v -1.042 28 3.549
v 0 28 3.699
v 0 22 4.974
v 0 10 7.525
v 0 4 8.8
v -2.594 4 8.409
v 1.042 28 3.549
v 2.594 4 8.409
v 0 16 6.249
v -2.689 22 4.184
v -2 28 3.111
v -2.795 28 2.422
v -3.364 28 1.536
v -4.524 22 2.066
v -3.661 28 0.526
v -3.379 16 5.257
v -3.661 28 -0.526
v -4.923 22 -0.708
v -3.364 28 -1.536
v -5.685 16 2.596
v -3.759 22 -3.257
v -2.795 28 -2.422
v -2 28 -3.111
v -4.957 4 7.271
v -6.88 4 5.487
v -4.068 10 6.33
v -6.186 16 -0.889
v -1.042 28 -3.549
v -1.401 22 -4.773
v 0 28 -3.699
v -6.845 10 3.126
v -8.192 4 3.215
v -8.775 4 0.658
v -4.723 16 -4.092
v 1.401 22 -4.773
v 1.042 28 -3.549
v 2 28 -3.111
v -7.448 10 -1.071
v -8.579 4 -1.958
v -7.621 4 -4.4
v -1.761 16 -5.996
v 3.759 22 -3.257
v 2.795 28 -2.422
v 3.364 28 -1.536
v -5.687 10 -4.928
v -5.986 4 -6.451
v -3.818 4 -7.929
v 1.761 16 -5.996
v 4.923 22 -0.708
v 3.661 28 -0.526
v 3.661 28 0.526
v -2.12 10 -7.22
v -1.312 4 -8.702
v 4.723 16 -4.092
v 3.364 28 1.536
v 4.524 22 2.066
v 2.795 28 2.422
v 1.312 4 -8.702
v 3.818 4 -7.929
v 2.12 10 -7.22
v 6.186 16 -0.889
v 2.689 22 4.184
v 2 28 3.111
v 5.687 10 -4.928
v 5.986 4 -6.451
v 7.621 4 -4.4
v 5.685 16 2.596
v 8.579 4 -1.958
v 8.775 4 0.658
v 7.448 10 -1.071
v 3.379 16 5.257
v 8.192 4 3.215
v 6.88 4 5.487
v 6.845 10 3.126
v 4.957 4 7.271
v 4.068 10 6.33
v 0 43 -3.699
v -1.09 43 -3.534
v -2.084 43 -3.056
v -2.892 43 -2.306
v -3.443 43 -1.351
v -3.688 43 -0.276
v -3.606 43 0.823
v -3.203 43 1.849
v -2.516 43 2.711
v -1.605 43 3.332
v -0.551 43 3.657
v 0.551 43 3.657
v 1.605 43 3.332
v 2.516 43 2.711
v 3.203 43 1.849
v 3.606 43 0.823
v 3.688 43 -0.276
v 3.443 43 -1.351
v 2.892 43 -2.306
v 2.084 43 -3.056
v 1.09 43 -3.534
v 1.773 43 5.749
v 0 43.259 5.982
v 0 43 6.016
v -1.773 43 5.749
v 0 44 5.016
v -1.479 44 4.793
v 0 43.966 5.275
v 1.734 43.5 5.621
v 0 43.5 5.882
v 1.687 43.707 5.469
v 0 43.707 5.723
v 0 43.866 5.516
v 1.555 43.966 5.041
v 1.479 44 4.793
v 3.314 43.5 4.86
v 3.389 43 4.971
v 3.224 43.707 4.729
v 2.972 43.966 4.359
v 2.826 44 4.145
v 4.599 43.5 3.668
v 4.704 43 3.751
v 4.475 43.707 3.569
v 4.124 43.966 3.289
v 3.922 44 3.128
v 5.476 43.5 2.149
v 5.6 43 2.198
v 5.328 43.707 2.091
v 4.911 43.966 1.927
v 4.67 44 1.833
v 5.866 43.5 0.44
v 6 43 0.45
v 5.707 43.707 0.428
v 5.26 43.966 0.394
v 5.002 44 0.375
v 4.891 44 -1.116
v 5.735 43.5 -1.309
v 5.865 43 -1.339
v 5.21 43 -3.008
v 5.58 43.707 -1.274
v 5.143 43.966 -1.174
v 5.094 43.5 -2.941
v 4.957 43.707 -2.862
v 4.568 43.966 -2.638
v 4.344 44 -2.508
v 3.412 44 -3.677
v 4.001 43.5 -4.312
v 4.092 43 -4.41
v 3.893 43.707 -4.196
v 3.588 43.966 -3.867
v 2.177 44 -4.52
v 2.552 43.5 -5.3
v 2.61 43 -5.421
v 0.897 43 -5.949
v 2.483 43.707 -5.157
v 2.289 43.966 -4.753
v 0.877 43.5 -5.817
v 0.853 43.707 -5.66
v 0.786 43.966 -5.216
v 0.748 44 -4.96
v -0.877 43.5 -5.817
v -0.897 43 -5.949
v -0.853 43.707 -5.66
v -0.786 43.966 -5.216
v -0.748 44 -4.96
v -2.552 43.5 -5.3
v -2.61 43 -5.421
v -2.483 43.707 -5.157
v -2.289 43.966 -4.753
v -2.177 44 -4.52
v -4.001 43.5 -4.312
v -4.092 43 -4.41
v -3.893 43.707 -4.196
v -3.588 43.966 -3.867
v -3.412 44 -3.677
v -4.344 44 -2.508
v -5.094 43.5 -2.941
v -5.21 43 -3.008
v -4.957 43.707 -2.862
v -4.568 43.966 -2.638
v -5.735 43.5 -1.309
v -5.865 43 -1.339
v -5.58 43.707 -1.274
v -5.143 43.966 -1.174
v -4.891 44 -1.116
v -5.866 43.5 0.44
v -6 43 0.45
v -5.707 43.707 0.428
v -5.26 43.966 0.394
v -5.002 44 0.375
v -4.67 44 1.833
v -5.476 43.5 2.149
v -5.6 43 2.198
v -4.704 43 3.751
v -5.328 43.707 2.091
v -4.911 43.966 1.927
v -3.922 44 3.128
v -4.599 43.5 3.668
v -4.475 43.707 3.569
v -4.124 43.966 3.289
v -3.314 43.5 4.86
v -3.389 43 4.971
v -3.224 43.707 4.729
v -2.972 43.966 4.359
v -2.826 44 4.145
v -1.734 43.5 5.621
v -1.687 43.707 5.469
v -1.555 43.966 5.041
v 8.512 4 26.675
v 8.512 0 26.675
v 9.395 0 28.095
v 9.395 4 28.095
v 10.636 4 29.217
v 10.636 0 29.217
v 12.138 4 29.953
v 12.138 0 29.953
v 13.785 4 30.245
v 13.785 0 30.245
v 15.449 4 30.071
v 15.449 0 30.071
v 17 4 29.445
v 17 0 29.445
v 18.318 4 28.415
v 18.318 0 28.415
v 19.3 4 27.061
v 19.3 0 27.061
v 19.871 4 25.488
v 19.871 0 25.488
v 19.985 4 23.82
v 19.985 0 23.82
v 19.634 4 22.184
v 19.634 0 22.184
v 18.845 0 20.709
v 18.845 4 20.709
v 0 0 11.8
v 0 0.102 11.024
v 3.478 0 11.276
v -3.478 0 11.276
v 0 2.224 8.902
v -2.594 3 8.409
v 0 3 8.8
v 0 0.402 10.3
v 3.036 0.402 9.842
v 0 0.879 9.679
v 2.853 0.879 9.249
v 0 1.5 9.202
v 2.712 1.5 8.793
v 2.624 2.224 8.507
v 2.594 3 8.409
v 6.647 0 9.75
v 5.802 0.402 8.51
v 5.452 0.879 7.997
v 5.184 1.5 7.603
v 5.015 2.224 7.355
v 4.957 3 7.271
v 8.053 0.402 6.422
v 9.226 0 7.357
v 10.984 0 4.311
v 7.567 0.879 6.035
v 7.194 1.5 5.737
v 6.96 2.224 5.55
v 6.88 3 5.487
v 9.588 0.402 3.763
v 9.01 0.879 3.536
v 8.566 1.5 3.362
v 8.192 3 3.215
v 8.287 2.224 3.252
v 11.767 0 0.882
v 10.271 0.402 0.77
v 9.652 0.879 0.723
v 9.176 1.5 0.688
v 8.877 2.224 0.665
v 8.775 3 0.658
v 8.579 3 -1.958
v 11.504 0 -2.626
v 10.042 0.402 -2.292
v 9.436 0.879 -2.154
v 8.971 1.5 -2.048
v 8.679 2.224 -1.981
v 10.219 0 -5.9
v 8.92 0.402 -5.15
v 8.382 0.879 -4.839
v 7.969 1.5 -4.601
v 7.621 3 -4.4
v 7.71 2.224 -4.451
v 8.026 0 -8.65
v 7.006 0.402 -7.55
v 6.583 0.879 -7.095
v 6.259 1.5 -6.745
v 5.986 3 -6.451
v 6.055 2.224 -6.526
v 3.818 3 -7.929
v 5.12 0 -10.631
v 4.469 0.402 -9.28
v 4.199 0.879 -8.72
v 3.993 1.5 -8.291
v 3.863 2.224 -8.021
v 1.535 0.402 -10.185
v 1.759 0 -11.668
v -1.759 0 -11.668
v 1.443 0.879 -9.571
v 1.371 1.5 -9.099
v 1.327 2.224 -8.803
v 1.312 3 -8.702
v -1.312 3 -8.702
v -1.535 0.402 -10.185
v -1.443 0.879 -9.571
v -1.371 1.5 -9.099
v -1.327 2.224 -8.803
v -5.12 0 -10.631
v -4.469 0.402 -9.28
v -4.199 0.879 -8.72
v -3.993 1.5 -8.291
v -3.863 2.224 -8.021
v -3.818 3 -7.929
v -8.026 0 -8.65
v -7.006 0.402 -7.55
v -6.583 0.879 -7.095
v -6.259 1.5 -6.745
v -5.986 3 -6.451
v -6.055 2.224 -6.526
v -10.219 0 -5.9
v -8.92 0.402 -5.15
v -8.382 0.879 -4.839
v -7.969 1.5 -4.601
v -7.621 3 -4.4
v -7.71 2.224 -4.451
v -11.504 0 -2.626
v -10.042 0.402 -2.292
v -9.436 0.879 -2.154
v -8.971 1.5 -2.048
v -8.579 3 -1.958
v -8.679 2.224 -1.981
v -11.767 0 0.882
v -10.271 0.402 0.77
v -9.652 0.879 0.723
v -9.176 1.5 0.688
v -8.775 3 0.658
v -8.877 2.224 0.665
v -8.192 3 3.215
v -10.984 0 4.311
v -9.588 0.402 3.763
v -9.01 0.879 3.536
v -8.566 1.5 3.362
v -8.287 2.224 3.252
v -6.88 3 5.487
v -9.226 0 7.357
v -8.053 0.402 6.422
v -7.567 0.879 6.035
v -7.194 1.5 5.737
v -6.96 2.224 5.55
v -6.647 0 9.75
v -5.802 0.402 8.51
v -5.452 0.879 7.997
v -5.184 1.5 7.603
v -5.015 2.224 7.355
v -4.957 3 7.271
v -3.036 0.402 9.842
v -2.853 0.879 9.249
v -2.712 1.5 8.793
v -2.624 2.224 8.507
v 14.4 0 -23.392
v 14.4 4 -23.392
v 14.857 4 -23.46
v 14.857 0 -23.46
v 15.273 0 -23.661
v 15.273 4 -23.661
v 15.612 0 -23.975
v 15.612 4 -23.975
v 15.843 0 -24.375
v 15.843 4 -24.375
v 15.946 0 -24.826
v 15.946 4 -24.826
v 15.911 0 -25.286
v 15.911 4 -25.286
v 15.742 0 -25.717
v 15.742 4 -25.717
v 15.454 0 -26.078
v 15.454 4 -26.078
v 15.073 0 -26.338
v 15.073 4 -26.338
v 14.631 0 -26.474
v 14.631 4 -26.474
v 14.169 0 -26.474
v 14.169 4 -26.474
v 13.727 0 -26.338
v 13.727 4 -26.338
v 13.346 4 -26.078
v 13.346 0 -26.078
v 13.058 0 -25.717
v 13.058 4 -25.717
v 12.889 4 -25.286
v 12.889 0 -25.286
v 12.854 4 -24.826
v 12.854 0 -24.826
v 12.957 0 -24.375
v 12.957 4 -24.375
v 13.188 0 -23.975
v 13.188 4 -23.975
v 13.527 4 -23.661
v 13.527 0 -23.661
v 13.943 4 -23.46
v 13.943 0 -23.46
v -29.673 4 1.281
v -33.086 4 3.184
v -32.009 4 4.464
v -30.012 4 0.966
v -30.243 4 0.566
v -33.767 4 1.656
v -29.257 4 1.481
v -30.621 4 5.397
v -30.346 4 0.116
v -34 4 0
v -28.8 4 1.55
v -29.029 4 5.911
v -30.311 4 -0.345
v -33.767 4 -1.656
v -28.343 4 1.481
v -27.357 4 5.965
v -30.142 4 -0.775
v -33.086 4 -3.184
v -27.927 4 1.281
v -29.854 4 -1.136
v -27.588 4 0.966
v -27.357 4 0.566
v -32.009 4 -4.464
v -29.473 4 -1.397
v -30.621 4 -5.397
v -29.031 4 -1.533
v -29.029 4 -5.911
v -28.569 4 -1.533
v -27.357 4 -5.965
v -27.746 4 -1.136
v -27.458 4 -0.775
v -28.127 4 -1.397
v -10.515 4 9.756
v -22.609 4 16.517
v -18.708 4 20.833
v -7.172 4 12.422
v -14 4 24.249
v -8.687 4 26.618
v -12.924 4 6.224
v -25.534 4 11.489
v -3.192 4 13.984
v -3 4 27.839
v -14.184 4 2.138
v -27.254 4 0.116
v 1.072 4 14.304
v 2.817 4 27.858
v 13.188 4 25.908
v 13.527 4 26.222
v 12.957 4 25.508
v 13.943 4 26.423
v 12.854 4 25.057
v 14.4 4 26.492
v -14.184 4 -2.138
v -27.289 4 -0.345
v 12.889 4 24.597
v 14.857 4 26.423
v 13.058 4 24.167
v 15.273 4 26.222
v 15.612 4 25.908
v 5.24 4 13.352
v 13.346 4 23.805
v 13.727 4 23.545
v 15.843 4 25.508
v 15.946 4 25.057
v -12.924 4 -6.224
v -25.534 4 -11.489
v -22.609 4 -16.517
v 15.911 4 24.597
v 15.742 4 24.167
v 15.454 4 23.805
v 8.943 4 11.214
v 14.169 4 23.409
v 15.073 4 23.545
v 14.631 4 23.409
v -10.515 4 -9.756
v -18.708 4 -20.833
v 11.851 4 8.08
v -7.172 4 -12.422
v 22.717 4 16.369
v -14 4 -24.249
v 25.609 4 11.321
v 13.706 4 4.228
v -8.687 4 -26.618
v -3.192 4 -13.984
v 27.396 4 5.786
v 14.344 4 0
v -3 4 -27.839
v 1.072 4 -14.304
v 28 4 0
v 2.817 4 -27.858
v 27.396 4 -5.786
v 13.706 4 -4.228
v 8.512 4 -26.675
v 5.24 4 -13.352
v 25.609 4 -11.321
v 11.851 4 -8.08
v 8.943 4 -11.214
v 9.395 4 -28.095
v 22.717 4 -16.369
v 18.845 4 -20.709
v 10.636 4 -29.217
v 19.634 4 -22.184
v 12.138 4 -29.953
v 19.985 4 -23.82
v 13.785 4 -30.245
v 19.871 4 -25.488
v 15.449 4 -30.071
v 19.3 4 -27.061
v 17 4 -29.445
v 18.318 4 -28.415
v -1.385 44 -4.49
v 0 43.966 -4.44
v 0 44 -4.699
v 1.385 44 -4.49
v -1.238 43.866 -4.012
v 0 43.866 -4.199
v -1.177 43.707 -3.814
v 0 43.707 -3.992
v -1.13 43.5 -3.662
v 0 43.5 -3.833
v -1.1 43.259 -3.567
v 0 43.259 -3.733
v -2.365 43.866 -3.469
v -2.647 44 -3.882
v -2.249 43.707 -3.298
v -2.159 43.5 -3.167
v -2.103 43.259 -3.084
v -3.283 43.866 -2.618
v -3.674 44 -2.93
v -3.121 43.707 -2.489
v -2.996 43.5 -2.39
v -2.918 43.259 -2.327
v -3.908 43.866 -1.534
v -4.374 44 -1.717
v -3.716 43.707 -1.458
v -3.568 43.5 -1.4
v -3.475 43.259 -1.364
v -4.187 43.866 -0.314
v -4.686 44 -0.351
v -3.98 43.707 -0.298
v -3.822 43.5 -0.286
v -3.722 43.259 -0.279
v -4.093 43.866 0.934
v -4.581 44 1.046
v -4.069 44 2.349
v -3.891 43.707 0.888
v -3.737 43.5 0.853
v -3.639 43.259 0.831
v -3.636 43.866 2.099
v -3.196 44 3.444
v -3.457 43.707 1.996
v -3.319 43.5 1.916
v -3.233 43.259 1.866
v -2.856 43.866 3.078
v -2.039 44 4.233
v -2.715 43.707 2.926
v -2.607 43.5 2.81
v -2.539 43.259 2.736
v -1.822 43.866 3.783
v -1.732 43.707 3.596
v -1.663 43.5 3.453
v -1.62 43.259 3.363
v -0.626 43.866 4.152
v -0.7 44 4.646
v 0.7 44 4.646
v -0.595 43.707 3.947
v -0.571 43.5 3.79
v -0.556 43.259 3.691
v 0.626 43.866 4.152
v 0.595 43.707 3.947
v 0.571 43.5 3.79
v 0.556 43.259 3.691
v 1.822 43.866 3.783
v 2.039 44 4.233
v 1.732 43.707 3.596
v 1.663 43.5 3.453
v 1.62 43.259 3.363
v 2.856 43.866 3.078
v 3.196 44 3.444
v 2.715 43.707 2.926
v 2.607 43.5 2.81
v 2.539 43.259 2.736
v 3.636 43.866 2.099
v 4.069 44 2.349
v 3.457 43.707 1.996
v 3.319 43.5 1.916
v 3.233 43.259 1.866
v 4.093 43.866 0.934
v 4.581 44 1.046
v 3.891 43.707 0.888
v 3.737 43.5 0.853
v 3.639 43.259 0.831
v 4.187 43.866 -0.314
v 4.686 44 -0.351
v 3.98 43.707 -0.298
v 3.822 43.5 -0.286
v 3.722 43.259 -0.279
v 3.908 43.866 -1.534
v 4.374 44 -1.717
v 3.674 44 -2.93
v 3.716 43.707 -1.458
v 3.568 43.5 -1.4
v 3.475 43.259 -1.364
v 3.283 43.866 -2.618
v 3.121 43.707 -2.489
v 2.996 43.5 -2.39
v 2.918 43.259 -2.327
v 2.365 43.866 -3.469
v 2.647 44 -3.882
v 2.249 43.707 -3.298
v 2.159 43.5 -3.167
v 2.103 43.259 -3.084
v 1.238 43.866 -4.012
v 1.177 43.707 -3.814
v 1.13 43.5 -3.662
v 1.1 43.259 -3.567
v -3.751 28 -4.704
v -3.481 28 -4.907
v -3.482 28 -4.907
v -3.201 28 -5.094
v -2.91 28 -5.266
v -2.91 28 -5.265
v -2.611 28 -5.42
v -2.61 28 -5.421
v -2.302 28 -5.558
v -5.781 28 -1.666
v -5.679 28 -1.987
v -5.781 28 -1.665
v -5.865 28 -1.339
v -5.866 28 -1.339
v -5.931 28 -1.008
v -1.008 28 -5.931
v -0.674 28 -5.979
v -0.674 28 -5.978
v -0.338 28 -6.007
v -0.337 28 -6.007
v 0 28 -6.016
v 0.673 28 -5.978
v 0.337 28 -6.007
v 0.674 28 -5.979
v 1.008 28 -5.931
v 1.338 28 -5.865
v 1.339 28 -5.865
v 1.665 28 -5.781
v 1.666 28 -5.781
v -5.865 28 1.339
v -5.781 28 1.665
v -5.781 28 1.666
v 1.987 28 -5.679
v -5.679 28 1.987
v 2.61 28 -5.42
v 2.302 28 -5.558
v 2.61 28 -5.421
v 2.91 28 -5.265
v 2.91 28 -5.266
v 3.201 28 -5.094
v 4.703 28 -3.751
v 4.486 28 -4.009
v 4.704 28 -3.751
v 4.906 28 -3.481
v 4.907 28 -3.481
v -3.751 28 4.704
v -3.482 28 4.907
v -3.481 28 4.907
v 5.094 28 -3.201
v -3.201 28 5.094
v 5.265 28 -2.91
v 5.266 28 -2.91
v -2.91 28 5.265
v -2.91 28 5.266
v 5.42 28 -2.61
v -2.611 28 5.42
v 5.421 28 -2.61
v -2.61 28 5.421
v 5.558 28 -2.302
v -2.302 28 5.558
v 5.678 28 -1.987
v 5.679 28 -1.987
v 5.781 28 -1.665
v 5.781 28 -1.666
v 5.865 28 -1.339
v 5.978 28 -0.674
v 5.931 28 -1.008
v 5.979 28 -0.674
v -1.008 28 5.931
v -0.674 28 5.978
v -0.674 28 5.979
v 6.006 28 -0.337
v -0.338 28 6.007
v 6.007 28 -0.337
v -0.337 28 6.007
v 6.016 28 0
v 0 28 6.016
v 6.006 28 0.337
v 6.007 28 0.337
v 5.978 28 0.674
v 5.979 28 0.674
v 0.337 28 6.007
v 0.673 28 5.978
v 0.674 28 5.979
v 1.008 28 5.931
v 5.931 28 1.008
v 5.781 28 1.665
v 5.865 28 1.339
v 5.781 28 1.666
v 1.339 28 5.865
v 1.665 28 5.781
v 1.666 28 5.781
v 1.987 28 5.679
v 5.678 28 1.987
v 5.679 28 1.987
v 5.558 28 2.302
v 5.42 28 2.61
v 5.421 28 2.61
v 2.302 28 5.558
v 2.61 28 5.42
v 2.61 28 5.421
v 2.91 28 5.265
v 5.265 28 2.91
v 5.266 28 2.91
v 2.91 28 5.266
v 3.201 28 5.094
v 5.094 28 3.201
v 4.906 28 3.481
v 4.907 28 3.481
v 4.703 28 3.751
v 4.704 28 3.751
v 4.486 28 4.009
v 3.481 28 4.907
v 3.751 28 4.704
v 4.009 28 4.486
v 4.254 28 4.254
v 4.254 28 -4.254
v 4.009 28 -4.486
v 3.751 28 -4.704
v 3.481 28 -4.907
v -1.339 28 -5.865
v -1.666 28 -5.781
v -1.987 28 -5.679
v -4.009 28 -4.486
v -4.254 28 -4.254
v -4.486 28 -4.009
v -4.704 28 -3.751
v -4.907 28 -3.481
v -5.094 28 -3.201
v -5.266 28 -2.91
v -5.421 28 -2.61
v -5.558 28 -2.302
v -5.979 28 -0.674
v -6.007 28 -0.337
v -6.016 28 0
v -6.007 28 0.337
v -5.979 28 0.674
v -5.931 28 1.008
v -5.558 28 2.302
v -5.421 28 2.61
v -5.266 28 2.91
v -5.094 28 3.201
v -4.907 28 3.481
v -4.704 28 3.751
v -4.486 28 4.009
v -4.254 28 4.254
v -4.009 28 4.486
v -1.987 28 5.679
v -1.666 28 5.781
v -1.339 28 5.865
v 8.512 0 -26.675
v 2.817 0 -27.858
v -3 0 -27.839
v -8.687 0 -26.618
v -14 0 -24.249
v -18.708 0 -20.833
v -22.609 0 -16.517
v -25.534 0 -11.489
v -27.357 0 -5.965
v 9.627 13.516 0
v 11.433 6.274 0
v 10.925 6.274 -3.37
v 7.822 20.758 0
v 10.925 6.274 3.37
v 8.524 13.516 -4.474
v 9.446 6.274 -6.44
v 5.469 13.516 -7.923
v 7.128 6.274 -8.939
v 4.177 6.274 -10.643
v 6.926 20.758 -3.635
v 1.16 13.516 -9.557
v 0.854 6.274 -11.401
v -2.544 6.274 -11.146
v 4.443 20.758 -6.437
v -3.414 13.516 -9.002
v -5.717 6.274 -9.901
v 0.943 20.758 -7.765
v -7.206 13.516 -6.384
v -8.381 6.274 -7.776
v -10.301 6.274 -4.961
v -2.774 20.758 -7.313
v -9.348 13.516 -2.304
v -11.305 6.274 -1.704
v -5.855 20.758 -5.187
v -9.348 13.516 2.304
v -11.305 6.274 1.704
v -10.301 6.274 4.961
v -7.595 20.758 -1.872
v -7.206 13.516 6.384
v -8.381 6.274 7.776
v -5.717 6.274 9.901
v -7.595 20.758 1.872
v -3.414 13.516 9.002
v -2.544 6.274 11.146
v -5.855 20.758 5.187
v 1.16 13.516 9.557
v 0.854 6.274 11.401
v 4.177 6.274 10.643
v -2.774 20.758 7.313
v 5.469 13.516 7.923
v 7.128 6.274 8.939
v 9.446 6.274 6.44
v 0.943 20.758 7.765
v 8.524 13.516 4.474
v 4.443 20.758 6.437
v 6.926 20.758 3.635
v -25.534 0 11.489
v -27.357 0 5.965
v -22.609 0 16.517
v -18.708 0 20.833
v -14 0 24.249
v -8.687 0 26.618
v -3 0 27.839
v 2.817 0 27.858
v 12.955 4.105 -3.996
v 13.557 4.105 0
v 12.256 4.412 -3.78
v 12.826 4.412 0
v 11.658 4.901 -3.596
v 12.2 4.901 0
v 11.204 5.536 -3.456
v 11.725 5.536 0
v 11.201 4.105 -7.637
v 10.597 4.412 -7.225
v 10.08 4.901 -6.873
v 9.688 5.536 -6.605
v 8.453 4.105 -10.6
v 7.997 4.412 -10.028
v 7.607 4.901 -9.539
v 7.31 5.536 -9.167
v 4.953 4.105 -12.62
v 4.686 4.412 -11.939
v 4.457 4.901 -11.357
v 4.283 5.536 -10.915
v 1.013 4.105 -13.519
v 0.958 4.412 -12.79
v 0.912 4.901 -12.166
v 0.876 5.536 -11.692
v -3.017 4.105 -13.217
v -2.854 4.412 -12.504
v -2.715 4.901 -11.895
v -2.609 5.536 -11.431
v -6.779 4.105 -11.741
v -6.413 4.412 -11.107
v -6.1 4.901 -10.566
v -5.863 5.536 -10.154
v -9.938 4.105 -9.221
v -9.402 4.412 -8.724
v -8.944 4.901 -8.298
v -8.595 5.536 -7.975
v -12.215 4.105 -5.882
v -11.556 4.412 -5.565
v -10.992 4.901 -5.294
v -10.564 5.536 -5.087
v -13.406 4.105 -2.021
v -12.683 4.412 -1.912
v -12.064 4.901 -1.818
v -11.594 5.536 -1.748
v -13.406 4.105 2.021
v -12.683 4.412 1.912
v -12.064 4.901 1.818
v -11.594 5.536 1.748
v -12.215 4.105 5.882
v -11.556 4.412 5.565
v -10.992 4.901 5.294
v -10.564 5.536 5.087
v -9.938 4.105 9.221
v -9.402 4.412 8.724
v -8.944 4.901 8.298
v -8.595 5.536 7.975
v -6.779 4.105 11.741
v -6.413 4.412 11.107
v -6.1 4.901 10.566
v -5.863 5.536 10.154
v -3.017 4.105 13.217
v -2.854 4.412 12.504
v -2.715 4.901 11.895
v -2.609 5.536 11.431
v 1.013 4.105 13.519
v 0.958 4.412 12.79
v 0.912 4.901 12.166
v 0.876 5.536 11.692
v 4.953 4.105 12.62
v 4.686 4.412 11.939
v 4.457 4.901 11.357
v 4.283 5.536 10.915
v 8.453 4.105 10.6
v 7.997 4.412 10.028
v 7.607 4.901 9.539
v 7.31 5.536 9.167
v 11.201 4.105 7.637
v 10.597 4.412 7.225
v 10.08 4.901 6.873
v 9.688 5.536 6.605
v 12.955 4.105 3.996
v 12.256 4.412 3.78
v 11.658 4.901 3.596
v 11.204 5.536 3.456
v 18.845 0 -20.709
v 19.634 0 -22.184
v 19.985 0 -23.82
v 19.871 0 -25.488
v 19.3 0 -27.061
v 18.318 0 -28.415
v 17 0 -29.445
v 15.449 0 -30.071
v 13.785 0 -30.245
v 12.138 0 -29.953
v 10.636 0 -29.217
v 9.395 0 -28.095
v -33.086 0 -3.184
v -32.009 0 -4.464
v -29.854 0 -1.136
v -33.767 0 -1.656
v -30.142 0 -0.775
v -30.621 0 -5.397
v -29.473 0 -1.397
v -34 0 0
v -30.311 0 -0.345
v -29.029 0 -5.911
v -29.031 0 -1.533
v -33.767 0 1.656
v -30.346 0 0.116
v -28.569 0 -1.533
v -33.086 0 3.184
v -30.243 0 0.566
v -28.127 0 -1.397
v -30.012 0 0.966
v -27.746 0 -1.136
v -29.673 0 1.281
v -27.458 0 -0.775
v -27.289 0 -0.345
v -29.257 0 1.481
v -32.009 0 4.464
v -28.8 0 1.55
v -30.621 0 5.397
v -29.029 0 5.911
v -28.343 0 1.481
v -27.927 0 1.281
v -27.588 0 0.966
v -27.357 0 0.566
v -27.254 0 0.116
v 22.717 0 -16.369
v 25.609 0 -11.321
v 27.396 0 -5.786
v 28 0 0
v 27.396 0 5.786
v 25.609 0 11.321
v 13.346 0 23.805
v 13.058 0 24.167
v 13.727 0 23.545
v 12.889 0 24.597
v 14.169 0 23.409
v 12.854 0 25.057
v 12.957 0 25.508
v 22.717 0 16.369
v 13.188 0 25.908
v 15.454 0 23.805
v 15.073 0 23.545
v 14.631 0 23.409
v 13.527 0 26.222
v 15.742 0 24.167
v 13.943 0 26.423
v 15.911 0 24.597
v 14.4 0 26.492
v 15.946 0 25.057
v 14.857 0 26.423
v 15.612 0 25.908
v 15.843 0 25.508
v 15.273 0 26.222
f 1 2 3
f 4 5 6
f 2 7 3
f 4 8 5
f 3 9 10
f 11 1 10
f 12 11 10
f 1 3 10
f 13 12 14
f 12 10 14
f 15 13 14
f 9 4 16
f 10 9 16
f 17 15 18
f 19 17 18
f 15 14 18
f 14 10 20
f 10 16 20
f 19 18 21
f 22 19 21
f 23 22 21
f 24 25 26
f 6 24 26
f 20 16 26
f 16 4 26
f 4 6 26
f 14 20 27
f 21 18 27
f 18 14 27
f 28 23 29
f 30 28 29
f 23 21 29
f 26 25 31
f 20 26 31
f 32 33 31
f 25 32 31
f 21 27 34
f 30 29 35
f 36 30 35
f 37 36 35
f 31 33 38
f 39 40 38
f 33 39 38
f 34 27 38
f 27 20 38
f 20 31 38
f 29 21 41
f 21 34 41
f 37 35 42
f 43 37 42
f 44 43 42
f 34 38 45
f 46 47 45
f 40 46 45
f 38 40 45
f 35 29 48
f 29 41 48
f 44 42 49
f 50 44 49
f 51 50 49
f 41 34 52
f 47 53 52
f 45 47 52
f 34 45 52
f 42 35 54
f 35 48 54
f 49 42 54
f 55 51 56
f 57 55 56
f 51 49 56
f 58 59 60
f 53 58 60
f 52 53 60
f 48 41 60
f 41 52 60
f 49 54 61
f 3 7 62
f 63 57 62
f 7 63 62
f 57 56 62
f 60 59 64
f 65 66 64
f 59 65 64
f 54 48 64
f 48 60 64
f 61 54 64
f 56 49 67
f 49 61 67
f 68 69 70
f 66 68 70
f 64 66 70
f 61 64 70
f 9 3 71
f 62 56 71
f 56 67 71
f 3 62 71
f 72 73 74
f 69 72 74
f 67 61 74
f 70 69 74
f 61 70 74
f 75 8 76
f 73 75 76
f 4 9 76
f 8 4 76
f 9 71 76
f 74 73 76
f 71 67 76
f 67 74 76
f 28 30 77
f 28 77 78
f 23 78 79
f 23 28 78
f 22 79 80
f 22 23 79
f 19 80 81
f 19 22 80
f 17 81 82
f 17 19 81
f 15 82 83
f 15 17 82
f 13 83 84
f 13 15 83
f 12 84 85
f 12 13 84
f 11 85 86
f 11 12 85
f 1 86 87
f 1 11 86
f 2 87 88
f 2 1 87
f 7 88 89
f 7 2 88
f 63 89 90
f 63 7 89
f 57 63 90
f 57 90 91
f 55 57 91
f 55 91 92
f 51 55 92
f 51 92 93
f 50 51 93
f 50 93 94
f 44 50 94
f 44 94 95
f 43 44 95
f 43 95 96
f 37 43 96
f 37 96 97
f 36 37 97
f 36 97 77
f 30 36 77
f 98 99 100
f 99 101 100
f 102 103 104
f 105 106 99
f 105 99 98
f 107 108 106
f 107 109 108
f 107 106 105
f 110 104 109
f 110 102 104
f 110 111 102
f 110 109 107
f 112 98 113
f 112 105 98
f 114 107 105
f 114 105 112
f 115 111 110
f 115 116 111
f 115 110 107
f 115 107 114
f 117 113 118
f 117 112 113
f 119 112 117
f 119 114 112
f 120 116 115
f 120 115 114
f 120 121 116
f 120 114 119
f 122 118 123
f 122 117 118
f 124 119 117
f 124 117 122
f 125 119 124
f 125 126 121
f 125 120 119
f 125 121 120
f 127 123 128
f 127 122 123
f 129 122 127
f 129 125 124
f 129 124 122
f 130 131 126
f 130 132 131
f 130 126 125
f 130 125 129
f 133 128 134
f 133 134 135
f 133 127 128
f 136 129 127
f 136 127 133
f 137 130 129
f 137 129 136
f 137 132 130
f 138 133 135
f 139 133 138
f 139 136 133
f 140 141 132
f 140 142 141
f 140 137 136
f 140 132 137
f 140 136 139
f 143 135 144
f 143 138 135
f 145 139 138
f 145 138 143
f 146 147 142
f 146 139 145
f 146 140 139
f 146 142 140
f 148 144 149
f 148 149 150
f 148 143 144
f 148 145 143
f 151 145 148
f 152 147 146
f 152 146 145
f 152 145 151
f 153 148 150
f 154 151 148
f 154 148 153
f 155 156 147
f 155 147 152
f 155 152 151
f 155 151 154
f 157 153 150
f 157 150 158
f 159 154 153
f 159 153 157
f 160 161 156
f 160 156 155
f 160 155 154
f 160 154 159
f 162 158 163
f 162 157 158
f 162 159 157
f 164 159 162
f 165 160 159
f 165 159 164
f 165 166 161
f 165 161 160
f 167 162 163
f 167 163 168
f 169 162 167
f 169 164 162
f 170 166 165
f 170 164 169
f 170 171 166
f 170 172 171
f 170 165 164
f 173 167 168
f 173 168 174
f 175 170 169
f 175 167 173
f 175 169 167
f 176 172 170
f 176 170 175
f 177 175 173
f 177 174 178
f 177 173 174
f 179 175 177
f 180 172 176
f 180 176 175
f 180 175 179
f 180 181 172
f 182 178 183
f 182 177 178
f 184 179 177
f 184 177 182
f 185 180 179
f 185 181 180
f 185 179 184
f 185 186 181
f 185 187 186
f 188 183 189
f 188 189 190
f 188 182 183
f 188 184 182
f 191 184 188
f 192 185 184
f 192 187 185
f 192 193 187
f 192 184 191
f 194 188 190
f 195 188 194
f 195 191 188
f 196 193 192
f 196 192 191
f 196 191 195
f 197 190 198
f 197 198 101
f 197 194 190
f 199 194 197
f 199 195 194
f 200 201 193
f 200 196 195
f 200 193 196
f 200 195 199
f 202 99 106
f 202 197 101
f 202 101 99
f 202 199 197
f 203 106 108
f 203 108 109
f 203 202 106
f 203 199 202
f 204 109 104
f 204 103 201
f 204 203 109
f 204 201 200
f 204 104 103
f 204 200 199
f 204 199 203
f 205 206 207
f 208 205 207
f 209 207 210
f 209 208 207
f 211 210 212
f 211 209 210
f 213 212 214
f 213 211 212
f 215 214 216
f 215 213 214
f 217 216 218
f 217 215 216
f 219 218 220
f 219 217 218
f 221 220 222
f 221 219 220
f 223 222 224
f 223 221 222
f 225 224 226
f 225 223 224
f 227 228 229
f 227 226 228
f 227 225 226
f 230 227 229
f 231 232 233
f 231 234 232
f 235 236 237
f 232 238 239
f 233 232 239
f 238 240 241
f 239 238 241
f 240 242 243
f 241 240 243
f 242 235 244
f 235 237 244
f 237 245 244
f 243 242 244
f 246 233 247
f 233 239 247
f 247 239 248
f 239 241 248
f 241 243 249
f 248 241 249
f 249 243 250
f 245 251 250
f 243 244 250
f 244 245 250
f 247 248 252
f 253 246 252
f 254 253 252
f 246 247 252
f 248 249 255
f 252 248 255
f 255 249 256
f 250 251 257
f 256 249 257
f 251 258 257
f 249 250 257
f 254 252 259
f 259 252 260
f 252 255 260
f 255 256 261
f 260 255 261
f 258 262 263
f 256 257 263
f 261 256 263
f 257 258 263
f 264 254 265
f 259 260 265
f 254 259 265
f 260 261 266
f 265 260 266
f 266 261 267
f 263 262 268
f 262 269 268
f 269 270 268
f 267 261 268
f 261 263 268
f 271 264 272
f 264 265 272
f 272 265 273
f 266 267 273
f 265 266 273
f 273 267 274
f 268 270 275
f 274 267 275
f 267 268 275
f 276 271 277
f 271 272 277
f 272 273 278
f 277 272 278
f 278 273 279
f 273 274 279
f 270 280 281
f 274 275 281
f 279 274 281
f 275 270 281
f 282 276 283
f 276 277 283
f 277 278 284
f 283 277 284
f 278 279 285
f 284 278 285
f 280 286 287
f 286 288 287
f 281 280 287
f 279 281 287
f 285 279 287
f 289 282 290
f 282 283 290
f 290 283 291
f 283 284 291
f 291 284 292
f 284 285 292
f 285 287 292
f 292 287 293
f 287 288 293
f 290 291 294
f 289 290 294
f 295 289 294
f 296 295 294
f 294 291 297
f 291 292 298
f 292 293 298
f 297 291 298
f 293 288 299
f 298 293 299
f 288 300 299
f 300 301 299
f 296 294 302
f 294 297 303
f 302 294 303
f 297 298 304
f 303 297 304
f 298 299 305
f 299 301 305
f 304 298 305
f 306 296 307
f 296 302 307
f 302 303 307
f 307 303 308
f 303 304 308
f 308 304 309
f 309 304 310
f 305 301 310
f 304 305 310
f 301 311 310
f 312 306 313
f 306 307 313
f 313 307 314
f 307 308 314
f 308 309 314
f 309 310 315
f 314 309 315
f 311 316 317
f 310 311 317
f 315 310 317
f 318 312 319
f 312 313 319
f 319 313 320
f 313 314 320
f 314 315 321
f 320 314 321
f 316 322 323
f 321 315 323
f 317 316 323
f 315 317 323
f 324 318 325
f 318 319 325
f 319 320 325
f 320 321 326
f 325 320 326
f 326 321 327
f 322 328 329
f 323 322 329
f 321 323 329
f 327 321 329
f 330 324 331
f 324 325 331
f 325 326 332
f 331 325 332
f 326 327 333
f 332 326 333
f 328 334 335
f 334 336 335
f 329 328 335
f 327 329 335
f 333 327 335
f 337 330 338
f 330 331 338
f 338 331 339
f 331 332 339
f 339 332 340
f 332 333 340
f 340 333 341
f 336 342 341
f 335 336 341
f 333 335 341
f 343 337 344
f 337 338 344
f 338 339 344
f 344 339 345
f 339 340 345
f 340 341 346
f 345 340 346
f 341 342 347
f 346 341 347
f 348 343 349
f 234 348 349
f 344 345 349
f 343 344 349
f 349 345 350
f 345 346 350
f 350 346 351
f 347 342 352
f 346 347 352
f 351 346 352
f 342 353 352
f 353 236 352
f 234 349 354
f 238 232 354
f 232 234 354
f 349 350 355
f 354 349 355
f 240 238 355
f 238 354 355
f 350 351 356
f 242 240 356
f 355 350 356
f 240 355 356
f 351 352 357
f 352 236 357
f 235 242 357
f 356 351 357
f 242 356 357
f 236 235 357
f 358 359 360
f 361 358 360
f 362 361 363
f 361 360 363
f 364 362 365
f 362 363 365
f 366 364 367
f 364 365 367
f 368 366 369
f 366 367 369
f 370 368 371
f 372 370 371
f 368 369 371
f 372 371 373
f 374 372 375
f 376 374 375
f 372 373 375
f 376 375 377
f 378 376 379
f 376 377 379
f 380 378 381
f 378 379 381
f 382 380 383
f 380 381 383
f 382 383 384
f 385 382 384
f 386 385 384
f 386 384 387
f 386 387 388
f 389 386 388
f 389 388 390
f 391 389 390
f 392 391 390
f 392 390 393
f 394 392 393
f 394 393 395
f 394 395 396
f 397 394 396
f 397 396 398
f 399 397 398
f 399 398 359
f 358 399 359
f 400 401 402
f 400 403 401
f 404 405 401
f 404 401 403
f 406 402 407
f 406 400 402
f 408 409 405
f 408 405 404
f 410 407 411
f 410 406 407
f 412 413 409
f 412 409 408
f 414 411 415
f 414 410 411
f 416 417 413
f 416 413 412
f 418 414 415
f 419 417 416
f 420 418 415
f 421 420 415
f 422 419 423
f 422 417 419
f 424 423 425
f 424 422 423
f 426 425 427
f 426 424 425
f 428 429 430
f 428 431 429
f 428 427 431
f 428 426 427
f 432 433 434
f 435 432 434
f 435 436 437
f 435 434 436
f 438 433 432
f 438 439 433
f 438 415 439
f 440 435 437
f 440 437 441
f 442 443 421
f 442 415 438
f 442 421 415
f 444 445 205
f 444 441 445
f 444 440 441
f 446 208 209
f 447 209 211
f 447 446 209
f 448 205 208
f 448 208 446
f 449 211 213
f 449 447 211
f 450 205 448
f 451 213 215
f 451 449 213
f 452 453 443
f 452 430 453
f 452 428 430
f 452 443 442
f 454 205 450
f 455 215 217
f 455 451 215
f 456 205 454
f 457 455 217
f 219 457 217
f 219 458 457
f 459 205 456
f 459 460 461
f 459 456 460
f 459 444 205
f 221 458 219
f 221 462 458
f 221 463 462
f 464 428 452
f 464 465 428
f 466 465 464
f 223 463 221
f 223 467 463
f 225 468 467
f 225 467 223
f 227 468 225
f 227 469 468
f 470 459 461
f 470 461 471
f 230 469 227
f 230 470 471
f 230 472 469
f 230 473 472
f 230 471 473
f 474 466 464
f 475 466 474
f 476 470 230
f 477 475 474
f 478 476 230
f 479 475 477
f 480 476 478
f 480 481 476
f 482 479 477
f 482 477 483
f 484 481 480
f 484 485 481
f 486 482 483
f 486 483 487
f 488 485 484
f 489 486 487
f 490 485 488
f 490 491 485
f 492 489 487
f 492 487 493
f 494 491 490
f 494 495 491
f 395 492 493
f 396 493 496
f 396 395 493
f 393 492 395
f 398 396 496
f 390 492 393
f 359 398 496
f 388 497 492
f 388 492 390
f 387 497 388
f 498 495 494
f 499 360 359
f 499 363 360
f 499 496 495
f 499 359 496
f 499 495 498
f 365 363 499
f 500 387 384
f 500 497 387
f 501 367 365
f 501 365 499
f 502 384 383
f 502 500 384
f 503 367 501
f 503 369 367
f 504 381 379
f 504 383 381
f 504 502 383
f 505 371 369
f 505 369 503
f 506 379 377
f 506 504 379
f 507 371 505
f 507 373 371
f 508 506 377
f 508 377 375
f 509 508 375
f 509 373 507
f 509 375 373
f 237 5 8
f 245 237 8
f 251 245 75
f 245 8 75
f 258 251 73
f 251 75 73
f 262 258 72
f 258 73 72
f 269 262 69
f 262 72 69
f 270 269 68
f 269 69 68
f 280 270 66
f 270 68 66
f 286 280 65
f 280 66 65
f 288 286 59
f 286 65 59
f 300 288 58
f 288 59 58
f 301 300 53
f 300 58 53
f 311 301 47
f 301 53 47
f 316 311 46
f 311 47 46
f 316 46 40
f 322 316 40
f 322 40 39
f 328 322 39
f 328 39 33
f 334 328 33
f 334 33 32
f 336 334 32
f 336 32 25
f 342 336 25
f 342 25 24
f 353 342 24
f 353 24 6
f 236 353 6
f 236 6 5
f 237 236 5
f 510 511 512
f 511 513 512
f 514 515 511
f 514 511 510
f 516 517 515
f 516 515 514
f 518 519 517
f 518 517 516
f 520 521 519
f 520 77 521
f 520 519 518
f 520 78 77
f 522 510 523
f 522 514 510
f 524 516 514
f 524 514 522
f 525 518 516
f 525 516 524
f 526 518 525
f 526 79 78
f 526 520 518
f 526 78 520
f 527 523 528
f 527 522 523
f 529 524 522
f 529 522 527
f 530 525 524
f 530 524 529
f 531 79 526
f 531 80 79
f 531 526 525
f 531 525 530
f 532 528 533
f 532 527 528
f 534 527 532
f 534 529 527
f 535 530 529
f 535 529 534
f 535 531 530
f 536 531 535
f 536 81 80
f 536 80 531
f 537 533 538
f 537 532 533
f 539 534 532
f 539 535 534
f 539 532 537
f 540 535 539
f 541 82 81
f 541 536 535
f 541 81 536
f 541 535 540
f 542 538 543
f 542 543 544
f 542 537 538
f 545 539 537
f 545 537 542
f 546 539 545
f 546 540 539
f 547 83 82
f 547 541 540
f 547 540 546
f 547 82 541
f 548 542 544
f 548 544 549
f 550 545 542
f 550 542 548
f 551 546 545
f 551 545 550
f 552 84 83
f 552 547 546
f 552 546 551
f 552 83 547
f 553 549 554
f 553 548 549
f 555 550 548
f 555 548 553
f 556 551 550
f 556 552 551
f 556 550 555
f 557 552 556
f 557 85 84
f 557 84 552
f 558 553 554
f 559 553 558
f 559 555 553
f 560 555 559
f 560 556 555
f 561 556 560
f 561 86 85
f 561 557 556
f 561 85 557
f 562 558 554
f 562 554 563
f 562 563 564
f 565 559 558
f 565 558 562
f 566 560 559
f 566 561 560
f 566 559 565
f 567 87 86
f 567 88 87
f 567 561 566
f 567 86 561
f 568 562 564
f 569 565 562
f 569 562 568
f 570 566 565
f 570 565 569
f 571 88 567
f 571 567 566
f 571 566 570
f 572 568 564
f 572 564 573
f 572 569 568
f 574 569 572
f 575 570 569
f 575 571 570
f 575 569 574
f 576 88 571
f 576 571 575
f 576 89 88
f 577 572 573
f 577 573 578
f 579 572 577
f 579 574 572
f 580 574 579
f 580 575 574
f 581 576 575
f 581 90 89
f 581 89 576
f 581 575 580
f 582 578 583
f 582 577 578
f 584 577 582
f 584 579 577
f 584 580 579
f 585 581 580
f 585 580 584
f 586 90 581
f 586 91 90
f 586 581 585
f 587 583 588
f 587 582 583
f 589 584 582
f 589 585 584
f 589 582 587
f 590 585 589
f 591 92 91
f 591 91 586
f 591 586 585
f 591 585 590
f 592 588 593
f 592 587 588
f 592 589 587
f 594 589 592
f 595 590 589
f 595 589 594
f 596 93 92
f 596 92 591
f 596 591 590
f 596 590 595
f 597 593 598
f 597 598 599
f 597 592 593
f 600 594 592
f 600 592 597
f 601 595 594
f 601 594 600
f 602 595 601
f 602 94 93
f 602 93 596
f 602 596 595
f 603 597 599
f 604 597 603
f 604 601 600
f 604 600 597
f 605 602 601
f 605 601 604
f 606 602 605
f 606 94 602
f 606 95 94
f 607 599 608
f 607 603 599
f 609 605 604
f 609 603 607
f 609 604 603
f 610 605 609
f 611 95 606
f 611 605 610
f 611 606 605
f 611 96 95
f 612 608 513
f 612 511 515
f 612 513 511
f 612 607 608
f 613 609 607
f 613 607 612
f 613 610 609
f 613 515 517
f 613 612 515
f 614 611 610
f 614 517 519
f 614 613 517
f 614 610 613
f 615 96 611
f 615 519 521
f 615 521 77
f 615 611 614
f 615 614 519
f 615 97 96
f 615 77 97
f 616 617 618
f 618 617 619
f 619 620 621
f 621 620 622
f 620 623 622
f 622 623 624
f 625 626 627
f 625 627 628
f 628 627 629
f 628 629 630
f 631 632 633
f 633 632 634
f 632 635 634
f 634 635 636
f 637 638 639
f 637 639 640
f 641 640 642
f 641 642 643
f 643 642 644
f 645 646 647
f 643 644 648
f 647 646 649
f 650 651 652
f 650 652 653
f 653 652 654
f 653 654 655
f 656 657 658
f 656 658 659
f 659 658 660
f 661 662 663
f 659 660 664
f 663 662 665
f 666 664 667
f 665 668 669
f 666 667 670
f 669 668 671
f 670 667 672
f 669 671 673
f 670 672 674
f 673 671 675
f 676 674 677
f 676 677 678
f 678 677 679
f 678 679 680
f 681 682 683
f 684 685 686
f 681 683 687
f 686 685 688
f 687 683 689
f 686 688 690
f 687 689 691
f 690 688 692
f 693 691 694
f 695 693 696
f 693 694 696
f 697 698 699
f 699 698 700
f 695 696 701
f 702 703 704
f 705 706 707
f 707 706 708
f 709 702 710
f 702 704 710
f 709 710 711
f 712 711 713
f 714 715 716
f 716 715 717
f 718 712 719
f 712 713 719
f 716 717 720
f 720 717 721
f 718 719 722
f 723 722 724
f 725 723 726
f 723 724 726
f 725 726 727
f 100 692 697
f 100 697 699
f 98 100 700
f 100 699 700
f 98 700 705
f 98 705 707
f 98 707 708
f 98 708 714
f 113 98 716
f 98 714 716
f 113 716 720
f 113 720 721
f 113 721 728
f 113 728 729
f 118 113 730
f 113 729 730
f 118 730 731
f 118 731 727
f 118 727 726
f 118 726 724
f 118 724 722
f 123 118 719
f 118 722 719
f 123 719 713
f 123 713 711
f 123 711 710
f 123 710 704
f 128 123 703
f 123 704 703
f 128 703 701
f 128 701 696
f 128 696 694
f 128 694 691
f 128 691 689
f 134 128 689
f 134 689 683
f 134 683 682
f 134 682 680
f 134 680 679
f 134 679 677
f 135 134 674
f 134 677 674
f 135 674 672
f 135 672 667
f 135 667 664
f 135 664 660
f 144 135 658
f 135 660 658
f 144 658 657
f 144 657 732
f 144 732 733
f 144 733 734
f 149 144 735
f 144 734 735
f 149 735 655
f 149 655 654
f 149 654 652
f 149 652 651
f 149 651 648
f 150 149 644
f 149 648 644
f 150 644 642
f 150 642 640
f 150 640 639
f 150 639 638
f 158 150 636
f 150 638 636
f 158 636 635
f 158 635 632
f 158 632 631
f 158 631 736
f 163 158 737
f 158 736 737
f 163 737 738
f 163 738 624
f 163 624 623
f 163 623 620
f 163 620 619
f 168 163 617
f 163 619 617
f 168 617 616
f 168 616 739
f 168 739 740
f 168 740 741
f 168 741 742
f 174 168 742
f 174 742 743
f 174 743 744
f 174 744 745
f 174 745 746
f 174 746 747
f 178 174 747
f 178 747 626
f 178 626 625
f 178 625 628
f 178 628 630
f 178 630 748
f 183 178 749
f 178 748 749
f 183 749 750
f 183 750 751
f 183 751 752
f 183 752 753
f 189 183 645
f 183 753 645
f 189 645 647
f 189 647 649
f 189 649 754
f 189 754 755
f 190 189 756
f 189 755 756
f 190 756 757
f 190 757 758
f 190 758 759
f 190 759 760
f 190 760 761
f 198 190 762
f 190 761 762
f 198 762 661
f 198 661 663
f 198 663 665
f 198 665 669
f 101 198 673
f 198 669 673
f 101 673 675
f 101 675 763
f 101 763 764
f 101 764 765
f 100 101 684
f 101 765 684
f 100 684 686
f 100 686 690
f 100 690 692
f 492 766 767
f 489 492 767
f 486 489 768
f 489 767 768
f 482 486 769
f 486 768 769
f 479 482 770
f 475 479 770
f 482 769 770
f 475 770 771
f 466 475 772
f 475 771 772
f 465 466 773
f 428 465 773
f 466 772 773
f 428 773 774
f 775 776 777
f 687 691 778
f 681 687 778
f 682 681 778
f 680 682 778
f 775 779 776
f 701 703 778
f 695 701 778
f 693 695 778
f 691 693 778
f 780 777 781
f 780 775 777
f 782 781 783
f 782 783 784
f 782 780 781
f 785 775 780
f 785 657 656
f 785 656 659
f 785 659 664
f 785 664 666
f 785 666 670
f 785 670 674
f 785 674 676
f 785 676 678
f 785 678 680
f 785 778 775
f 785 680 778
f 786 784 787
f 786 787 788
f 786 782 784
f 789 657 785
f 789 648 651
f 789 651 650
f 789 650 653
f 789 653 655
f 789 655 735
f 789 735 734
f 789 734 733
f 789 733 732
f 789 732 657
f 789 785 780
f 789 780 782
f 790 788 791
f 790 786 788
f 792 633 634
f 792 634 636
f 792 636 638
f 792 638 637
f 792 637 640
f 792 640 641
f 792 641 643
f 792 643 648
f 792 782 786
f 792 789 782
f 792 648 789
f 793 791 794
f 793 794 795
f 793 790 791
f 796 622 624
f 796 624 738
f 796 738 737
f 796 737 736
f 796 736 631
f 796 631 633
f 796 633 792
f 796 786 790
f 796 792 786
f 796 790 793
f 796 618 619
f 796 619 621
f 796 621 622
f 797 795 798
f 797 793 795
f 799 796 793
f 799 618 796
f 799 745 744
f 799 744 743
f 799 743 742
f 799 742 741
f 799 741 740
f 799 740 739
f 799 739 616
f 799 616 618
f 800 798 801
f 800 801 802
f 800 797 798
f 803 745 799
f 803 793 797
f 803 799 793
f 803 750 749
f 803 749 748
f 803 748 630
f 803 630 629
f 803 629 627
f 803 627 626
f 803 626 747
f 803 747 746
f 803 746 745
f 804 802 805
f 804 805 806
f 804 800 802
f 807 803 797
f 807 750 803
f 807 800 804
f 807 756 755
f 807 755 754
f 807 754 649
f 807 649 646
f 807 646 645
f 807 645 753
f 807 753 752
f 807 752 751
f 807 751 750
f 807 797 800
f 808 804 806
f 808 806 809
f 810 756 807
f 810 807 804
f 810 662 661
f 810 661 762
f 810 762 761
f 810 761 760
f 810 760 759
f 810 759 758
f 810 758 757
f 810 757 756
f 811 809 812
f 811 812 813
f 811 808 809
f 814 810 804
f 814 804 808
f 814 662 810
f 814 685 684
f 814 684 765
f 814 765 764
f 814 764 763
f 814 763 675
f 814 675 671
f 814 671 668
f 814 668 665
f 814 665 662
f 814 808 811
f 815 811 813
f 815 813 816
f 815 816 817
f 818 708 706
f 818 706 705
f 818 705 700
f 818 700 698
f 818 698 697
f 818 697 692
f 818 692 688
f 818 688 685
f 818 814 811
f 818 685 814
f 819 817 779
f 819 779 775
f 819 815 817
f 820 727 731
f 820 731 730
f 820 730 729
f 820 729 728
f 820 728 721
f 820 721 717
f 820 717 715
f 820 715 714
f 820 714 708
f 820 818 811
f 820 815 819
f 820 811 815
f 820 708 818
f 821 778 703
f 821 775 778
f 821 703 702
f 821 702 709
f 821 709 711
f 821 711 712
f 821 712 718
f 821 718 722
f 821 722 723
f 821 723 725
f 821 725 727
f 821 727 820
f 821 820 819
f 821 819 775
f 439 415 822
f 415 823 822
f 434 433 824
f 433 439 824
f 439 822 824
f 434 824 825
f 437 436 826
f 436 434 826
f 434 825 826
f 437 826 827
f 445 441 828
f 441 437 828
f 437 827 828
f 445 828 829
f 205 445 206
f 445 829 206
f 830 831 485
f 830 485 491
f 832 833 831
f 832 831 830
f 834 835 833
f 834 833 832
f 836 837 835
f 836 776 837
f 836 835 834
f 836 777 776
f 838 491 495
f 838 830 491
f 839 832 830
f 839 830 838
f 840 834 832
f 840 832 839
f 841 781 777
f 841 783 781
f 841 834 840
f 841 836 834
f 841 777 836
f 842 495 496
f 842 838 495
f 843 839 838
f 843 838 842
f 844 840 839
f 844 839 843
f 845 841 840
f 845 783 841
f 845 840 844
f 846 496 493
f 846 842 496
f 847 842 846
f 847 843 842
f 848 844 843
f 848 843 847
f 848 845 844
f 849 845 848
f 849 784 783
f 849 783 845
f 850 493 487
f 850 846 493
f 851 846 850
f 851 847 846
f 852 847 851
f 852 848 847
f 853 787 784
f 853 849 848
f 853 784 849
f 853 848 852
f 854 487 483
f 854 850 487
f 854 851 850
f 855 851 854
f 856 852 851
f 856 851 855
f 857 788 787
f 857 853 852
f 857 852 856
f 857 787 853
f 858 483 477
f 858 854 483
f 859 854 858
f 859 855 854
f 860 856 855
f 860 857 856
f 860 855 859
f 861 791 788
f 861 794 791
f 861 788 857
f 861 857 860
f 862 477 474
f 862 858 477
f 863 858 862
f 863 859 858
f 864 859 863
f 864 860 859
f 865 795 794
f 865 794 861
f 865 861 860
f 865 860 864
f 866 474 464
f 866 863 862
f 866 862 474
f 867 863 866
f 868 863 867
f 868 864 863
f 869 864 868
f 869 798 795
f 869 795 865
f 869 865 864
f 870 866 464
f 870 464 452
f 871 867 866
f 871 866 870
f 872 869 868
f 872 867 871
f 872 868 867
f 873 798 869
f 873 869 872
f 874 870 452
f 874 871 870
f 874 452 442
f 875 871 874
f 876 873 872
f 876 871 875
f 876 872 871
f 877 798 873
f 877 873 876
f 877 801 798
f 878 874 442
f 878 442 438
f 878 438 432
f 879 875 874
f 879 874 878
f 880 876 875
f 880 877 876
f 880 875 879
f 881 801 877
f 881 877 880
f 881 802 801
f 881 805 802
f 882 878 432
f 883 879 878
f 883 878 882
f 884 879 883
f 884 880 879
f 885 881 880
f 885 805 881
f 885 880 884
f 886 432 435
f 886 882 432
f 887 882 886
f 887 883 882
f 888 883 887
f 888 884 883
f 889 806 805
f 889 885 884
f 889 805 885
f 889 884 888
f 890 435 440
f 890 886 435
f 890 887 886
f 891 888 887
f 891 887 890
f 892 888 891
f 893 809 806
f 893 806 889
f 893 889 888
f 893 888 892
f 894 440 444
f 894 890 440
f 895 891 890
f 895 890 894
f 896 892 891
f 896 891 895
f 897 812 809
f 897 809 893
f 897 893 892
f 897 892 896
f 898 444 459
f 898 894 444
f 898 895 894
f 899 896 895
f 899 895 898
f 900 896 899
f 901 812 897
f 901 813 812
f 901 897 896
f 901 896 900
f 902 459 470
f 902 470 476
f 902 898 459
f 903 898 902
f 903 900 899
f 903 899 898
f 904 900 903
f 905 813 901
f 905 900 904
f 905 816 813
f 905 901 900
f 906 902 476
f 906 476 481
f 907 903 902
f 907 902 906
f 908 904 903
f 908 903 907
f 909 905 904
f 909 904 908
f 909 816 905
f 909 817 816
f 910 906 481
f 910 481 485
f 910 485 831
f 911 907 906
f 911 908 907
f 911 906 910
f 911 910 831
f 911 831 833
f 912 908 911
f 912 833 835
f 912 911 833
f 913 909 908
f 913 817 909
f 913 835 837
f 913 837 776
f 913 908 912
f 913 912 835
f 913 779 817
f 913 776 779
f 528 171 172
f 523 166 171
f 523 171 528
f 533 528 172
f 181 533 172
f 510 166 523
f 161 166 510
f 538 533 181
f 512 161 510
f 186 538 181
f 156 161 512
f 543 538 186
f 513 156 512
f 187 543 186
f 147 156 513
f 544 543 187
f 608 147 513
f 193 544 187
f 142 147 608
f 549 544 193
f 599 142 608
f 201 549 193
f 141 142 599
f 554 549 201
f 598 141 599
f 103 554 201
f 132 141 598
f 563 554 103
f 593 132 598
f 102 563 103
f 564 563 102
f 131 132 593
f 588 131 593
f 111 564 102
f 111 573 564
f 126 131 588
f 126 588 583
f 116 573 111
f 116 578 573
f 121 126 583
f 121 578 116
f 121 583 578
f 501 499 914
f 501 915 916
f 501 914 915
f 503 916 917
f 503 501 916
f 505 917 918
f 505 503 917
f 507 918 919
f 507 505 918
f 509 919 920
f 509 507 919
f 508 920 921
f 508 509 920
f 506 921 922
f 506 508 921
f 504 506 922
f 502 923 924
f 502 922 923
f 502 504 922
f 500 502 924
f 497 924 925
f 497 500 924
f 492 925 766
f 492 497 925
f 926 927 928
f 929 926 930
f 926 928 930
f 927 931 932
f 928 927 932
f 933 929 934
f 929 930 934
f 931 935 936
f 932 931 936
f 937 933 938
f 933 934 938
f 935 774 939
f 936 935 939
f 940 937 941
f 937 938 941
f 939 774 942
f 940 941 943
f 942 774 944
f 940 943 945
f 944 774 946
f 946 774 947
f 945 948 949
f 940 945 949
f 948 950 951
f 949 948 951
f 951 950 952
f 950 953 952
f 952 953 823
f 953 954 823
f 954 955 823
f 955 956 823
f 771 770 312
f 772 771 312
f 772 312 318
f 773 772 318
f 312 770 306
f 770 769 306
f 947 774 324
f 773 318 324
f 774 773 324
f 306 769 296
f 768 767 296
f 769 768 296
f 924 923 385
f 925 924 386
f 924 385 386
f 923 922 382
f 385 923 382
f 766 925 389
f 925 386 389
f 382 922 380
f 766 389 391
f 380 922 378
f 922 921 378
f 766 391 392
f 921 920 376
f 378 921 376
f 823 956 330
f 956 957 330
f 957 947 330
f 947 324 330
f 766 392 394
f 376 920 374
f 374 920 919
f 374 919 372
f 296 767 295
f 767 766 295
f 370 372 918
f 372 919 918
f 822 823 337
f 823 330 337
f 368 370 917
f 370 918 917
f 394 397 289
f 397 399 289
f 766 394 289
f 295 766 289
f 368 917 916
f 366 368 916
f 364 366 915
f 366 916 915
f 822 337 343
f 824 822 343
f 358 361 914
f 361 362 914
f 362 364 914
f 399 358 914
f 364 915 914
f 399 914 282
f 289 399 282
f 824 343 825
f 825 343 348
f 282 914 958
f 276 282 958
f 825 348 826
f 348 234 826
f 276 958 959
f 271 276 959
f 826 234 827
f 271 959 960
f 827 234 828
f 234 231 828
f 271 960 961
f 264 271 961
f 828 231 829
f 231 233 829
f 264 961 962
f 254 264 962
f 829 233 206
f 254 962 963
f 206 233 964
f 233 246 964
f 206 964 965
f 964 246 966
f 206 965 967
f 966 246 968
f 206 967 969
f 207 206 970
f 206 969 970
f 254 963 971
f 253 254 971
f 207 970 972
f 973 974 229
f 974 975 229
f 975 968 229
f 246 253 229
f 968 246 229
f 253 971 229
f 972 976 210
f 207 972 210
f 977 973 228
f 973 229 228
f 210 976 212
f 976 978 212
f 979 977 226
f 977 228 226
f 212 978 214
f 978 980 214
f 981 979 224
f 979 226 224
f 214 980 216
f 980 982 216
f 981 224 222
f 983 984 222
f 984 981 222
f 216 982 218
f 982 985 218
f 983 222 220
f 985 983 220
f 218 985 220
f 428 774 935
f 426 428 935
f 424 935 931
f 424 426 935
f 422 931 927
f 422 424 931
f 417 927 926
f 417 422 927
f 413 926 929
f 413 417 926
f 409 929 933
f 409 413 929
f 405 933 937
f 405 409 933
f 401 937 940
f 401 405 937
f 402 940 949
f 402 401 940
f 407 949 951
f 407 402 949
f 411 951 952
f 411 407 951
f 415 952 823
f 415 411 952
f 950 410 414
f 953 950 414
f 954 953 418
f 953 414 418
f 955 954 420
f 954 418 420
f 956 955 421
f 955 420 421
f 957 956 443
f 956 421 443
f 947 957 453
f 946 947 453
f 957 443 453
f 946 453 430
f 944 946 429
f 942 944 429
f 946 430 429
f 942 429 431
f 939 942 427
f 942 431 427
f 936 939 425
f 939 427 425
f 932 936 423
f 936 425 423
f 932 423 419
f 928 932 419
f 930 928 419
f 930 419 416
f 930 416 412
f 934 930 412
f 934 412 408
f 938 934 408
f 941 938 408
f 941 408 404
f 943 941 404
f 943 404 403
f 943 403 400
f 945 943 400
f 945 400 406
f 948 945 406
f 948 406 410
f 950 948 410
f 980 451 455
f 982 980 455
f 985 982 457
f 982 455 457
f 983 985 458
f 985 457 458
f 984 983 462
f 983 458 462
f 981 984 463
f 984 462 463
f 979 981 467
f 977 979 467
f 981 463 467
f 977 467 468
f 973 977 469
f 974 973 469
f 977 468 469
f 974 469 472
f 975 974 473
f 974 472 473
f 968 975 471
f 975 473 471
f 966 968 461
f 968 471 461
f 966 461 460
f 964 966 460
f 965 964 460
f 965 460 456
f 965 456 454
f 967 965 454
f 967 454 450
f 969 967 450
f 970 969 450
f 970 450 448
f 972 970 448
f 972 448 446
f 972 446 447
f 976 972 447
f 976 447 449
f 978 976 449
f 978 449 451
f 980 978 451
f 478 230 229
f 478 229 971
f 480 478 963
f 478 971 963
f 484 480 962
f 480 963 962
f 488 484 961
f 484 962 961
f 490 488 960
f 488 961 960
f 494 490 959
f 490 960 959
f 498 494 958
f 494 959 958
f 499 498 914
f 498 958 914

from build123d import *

# Parameters (mm, degrees)
SKETCH1_R            = 28
BOSS_EXTRUDE1_DEPTH  = 4
SKETCH2_R            = 6
BOSS_EXTRUDE3_DEPTH  = 4
SKETCH3_R            = 1.55
CUT_EXTRUDE1_DEPTH   = 46.683525867
SKETCH4_R            = 8.8
CUT_EXTRUDE2_DEPTH   = 46.683525867
SKETCH5_R            = 12
BOSS_EXTRUDE4_DEPTH  = 24
BOSS_EXTRUDE4_TAPER  = 14
FILLET1_R            = 3
FILLET2_R            = 3
SKETCH17_R           = 8.8
CUT_EXTRUDE4_DEPTH   = 24
CUT_EXTRUDE4_DRAFT   = -12
SKETCH19_R           = 6.01633814
SKETCH19_R_2         = 3.69864252
BOSS_EXTRUDE10_DEPTH = 16
FILLET3_R            = 1


with BuildPart() as part:
    # Sketch1 → Boss-Extrude1 (new body)
    with BuildSketch(Plane(origin=(0, 0, 0), x_dir=(1, 0, 0), z_dir=(0, 1, 0))):
        with Locations(Location((0, 0, 0), (0, 0, 270))):
            Circle(SKETCH1_R)
    extrude(amount=BOSS_EXTRUDE1_DEPTH)

    # Sketch2 → Boss-Extrude3 (add)
    with BuildSketch(Plane(origin=(0, 4, 0), x_dir=(1, 0, 0), z_dir=(0, 1, 0))):
        with Locations((-28, 0)):
            Circle(SKETCH2_R)
        with Locations((14, 24.248711306)):
            Circle(SKETCH2_R)
        with Locations((14, -24.248711306)):
            Circle(SKETCH2_R)
    extrude(amount=-BOSS_EXTRUDE3_DEPTH)

    # Sketch3 → Cut-Extrude1 (cut, through all)
    with BuildSketch(Plane(origin=(0, 4, 0), x_dir=(1, 0, 0), z_dir=(0, 1, 0))):
        with Locations(Location((-28.8, 0, 0), (0, 0, 270))):
            Circle(SKETCH3_R)
        with Locations(Location((14.4, 24.941531629, 0), (0, 0, 270))):
            Circle(SKETCH3_R)
        with Locations(Location((14.4, -24.941531629, 0), (0, 0, 270))):
            Circle(SKETCH3_R)
    extrude(amount=-CUT_EXTRUDE1_DEPTH, mode=Mode.SUBTRACT)

    # Sketch4 → Cut-Extrude2 (cut, through all)
    with BuildSketch(Plane(origin=(0, 4, 0), x_dir=(1, 0, 0), z_dir=(0, 1, 0))):
        with Locations(Location((0, 0, 0), (0, 0, 270))):
            Circle(SKETCH4_R)
    extrude(amount=-CUT_EXTRUDE2_DEPTH, mode=Mode.SUBTRACT)

    # Sketch5 → Boss-Extrude4 (add)
    with BuildSketch(Plane(origin=(0, 4, 0), x_dir=(1, 0, 0), z_dir=(0, 1, 0))):
        with Locations((-0.000210208, 0)):
            Circle(SKETCH5_R)
    extrude(amount=BOSS_EXTRUDE4_DEPTH, taper=BOSS_EXTRUDE4_TAPER)

    # Fillet1
    fillet1_edges = [part.edges().sort_by_distance(p)[0] for p in [
        (0, 0, -8.8),
    ]]
    fillet(fillet1_edges, radius=FILLET1_R)

    # Fillet2
    fillet2_edges = [part.edges().sort_by_distance(p)[0] for p in [
        (-12.000210208, 4, 0),
    ]]
    fillet(fillet2_edges, radius=FILLET2_R)


with BuildPart() as cut_extrude4_tool:
    # Sketch17 → Cut-Extrude4 (with draft: the straight prism first)
    with BuildSketch(Plane(origin=(0, 4, 0), x_dir=(-1, 0, 0), z_dir=(0, -1, 0))):
        with Locations(Location((0, 0, 0), (0, 0, 270))):
            Circle(SKETCH17_R)
    extrude(amount=-CUT_EXTRUDE4_DEPTH)
    # Cut-Extrude4: the draft: its side faces are tilted about the plane it starts from
    cut_extrude4_sides = [cut_extrude4_tool.faces().sort_by_distance(p)[0] for p in [
        (0, 16, -8.8),
    ]]
    draft(cut_extrude4_sides, Plane(origin=(0, 4, 0), x_dir=(-1, 0, 0), z_dir=(0, -1, 0)), CUT_EXTRUDE4_DRAFT)


with BuildPart() as part_1:
    add(part.part)

    # Cut-Extrude4: cut by cut_extrude4_tool
    add(cut_extrude4_tool.part, mode=Mode.SUBTRACT)

    # Sketch19 → Boss-Extrude10 (add)
    with BuildSketch(Plane(origin=(0, 28, 0), x_dir=(1, 0, 0), z_dir=(0, 1, 0))):
        with Locations(Location((0, 0, 0), (0, 0, 270))):
            Circle(SKETCH19_R)
        with Locations(Location((0, 0, 0), (0, 0, 90))):
            Circle(SKETCH19_R_2, mode=Mode.SUBTRACT)
    extrude(amount=BOSS_EXTRUDE10_DEPTH)

    # Fillet3
    fillet3_edges = [part_1.edges().sort_by_distance(p)[0] for p in [
        (0, 44, -6.01633814),
        (0, 44, 3.69864252),
    ]]
    fillet(fillet3_edges, radius=FILLET3_R)


solid = part_1.part
